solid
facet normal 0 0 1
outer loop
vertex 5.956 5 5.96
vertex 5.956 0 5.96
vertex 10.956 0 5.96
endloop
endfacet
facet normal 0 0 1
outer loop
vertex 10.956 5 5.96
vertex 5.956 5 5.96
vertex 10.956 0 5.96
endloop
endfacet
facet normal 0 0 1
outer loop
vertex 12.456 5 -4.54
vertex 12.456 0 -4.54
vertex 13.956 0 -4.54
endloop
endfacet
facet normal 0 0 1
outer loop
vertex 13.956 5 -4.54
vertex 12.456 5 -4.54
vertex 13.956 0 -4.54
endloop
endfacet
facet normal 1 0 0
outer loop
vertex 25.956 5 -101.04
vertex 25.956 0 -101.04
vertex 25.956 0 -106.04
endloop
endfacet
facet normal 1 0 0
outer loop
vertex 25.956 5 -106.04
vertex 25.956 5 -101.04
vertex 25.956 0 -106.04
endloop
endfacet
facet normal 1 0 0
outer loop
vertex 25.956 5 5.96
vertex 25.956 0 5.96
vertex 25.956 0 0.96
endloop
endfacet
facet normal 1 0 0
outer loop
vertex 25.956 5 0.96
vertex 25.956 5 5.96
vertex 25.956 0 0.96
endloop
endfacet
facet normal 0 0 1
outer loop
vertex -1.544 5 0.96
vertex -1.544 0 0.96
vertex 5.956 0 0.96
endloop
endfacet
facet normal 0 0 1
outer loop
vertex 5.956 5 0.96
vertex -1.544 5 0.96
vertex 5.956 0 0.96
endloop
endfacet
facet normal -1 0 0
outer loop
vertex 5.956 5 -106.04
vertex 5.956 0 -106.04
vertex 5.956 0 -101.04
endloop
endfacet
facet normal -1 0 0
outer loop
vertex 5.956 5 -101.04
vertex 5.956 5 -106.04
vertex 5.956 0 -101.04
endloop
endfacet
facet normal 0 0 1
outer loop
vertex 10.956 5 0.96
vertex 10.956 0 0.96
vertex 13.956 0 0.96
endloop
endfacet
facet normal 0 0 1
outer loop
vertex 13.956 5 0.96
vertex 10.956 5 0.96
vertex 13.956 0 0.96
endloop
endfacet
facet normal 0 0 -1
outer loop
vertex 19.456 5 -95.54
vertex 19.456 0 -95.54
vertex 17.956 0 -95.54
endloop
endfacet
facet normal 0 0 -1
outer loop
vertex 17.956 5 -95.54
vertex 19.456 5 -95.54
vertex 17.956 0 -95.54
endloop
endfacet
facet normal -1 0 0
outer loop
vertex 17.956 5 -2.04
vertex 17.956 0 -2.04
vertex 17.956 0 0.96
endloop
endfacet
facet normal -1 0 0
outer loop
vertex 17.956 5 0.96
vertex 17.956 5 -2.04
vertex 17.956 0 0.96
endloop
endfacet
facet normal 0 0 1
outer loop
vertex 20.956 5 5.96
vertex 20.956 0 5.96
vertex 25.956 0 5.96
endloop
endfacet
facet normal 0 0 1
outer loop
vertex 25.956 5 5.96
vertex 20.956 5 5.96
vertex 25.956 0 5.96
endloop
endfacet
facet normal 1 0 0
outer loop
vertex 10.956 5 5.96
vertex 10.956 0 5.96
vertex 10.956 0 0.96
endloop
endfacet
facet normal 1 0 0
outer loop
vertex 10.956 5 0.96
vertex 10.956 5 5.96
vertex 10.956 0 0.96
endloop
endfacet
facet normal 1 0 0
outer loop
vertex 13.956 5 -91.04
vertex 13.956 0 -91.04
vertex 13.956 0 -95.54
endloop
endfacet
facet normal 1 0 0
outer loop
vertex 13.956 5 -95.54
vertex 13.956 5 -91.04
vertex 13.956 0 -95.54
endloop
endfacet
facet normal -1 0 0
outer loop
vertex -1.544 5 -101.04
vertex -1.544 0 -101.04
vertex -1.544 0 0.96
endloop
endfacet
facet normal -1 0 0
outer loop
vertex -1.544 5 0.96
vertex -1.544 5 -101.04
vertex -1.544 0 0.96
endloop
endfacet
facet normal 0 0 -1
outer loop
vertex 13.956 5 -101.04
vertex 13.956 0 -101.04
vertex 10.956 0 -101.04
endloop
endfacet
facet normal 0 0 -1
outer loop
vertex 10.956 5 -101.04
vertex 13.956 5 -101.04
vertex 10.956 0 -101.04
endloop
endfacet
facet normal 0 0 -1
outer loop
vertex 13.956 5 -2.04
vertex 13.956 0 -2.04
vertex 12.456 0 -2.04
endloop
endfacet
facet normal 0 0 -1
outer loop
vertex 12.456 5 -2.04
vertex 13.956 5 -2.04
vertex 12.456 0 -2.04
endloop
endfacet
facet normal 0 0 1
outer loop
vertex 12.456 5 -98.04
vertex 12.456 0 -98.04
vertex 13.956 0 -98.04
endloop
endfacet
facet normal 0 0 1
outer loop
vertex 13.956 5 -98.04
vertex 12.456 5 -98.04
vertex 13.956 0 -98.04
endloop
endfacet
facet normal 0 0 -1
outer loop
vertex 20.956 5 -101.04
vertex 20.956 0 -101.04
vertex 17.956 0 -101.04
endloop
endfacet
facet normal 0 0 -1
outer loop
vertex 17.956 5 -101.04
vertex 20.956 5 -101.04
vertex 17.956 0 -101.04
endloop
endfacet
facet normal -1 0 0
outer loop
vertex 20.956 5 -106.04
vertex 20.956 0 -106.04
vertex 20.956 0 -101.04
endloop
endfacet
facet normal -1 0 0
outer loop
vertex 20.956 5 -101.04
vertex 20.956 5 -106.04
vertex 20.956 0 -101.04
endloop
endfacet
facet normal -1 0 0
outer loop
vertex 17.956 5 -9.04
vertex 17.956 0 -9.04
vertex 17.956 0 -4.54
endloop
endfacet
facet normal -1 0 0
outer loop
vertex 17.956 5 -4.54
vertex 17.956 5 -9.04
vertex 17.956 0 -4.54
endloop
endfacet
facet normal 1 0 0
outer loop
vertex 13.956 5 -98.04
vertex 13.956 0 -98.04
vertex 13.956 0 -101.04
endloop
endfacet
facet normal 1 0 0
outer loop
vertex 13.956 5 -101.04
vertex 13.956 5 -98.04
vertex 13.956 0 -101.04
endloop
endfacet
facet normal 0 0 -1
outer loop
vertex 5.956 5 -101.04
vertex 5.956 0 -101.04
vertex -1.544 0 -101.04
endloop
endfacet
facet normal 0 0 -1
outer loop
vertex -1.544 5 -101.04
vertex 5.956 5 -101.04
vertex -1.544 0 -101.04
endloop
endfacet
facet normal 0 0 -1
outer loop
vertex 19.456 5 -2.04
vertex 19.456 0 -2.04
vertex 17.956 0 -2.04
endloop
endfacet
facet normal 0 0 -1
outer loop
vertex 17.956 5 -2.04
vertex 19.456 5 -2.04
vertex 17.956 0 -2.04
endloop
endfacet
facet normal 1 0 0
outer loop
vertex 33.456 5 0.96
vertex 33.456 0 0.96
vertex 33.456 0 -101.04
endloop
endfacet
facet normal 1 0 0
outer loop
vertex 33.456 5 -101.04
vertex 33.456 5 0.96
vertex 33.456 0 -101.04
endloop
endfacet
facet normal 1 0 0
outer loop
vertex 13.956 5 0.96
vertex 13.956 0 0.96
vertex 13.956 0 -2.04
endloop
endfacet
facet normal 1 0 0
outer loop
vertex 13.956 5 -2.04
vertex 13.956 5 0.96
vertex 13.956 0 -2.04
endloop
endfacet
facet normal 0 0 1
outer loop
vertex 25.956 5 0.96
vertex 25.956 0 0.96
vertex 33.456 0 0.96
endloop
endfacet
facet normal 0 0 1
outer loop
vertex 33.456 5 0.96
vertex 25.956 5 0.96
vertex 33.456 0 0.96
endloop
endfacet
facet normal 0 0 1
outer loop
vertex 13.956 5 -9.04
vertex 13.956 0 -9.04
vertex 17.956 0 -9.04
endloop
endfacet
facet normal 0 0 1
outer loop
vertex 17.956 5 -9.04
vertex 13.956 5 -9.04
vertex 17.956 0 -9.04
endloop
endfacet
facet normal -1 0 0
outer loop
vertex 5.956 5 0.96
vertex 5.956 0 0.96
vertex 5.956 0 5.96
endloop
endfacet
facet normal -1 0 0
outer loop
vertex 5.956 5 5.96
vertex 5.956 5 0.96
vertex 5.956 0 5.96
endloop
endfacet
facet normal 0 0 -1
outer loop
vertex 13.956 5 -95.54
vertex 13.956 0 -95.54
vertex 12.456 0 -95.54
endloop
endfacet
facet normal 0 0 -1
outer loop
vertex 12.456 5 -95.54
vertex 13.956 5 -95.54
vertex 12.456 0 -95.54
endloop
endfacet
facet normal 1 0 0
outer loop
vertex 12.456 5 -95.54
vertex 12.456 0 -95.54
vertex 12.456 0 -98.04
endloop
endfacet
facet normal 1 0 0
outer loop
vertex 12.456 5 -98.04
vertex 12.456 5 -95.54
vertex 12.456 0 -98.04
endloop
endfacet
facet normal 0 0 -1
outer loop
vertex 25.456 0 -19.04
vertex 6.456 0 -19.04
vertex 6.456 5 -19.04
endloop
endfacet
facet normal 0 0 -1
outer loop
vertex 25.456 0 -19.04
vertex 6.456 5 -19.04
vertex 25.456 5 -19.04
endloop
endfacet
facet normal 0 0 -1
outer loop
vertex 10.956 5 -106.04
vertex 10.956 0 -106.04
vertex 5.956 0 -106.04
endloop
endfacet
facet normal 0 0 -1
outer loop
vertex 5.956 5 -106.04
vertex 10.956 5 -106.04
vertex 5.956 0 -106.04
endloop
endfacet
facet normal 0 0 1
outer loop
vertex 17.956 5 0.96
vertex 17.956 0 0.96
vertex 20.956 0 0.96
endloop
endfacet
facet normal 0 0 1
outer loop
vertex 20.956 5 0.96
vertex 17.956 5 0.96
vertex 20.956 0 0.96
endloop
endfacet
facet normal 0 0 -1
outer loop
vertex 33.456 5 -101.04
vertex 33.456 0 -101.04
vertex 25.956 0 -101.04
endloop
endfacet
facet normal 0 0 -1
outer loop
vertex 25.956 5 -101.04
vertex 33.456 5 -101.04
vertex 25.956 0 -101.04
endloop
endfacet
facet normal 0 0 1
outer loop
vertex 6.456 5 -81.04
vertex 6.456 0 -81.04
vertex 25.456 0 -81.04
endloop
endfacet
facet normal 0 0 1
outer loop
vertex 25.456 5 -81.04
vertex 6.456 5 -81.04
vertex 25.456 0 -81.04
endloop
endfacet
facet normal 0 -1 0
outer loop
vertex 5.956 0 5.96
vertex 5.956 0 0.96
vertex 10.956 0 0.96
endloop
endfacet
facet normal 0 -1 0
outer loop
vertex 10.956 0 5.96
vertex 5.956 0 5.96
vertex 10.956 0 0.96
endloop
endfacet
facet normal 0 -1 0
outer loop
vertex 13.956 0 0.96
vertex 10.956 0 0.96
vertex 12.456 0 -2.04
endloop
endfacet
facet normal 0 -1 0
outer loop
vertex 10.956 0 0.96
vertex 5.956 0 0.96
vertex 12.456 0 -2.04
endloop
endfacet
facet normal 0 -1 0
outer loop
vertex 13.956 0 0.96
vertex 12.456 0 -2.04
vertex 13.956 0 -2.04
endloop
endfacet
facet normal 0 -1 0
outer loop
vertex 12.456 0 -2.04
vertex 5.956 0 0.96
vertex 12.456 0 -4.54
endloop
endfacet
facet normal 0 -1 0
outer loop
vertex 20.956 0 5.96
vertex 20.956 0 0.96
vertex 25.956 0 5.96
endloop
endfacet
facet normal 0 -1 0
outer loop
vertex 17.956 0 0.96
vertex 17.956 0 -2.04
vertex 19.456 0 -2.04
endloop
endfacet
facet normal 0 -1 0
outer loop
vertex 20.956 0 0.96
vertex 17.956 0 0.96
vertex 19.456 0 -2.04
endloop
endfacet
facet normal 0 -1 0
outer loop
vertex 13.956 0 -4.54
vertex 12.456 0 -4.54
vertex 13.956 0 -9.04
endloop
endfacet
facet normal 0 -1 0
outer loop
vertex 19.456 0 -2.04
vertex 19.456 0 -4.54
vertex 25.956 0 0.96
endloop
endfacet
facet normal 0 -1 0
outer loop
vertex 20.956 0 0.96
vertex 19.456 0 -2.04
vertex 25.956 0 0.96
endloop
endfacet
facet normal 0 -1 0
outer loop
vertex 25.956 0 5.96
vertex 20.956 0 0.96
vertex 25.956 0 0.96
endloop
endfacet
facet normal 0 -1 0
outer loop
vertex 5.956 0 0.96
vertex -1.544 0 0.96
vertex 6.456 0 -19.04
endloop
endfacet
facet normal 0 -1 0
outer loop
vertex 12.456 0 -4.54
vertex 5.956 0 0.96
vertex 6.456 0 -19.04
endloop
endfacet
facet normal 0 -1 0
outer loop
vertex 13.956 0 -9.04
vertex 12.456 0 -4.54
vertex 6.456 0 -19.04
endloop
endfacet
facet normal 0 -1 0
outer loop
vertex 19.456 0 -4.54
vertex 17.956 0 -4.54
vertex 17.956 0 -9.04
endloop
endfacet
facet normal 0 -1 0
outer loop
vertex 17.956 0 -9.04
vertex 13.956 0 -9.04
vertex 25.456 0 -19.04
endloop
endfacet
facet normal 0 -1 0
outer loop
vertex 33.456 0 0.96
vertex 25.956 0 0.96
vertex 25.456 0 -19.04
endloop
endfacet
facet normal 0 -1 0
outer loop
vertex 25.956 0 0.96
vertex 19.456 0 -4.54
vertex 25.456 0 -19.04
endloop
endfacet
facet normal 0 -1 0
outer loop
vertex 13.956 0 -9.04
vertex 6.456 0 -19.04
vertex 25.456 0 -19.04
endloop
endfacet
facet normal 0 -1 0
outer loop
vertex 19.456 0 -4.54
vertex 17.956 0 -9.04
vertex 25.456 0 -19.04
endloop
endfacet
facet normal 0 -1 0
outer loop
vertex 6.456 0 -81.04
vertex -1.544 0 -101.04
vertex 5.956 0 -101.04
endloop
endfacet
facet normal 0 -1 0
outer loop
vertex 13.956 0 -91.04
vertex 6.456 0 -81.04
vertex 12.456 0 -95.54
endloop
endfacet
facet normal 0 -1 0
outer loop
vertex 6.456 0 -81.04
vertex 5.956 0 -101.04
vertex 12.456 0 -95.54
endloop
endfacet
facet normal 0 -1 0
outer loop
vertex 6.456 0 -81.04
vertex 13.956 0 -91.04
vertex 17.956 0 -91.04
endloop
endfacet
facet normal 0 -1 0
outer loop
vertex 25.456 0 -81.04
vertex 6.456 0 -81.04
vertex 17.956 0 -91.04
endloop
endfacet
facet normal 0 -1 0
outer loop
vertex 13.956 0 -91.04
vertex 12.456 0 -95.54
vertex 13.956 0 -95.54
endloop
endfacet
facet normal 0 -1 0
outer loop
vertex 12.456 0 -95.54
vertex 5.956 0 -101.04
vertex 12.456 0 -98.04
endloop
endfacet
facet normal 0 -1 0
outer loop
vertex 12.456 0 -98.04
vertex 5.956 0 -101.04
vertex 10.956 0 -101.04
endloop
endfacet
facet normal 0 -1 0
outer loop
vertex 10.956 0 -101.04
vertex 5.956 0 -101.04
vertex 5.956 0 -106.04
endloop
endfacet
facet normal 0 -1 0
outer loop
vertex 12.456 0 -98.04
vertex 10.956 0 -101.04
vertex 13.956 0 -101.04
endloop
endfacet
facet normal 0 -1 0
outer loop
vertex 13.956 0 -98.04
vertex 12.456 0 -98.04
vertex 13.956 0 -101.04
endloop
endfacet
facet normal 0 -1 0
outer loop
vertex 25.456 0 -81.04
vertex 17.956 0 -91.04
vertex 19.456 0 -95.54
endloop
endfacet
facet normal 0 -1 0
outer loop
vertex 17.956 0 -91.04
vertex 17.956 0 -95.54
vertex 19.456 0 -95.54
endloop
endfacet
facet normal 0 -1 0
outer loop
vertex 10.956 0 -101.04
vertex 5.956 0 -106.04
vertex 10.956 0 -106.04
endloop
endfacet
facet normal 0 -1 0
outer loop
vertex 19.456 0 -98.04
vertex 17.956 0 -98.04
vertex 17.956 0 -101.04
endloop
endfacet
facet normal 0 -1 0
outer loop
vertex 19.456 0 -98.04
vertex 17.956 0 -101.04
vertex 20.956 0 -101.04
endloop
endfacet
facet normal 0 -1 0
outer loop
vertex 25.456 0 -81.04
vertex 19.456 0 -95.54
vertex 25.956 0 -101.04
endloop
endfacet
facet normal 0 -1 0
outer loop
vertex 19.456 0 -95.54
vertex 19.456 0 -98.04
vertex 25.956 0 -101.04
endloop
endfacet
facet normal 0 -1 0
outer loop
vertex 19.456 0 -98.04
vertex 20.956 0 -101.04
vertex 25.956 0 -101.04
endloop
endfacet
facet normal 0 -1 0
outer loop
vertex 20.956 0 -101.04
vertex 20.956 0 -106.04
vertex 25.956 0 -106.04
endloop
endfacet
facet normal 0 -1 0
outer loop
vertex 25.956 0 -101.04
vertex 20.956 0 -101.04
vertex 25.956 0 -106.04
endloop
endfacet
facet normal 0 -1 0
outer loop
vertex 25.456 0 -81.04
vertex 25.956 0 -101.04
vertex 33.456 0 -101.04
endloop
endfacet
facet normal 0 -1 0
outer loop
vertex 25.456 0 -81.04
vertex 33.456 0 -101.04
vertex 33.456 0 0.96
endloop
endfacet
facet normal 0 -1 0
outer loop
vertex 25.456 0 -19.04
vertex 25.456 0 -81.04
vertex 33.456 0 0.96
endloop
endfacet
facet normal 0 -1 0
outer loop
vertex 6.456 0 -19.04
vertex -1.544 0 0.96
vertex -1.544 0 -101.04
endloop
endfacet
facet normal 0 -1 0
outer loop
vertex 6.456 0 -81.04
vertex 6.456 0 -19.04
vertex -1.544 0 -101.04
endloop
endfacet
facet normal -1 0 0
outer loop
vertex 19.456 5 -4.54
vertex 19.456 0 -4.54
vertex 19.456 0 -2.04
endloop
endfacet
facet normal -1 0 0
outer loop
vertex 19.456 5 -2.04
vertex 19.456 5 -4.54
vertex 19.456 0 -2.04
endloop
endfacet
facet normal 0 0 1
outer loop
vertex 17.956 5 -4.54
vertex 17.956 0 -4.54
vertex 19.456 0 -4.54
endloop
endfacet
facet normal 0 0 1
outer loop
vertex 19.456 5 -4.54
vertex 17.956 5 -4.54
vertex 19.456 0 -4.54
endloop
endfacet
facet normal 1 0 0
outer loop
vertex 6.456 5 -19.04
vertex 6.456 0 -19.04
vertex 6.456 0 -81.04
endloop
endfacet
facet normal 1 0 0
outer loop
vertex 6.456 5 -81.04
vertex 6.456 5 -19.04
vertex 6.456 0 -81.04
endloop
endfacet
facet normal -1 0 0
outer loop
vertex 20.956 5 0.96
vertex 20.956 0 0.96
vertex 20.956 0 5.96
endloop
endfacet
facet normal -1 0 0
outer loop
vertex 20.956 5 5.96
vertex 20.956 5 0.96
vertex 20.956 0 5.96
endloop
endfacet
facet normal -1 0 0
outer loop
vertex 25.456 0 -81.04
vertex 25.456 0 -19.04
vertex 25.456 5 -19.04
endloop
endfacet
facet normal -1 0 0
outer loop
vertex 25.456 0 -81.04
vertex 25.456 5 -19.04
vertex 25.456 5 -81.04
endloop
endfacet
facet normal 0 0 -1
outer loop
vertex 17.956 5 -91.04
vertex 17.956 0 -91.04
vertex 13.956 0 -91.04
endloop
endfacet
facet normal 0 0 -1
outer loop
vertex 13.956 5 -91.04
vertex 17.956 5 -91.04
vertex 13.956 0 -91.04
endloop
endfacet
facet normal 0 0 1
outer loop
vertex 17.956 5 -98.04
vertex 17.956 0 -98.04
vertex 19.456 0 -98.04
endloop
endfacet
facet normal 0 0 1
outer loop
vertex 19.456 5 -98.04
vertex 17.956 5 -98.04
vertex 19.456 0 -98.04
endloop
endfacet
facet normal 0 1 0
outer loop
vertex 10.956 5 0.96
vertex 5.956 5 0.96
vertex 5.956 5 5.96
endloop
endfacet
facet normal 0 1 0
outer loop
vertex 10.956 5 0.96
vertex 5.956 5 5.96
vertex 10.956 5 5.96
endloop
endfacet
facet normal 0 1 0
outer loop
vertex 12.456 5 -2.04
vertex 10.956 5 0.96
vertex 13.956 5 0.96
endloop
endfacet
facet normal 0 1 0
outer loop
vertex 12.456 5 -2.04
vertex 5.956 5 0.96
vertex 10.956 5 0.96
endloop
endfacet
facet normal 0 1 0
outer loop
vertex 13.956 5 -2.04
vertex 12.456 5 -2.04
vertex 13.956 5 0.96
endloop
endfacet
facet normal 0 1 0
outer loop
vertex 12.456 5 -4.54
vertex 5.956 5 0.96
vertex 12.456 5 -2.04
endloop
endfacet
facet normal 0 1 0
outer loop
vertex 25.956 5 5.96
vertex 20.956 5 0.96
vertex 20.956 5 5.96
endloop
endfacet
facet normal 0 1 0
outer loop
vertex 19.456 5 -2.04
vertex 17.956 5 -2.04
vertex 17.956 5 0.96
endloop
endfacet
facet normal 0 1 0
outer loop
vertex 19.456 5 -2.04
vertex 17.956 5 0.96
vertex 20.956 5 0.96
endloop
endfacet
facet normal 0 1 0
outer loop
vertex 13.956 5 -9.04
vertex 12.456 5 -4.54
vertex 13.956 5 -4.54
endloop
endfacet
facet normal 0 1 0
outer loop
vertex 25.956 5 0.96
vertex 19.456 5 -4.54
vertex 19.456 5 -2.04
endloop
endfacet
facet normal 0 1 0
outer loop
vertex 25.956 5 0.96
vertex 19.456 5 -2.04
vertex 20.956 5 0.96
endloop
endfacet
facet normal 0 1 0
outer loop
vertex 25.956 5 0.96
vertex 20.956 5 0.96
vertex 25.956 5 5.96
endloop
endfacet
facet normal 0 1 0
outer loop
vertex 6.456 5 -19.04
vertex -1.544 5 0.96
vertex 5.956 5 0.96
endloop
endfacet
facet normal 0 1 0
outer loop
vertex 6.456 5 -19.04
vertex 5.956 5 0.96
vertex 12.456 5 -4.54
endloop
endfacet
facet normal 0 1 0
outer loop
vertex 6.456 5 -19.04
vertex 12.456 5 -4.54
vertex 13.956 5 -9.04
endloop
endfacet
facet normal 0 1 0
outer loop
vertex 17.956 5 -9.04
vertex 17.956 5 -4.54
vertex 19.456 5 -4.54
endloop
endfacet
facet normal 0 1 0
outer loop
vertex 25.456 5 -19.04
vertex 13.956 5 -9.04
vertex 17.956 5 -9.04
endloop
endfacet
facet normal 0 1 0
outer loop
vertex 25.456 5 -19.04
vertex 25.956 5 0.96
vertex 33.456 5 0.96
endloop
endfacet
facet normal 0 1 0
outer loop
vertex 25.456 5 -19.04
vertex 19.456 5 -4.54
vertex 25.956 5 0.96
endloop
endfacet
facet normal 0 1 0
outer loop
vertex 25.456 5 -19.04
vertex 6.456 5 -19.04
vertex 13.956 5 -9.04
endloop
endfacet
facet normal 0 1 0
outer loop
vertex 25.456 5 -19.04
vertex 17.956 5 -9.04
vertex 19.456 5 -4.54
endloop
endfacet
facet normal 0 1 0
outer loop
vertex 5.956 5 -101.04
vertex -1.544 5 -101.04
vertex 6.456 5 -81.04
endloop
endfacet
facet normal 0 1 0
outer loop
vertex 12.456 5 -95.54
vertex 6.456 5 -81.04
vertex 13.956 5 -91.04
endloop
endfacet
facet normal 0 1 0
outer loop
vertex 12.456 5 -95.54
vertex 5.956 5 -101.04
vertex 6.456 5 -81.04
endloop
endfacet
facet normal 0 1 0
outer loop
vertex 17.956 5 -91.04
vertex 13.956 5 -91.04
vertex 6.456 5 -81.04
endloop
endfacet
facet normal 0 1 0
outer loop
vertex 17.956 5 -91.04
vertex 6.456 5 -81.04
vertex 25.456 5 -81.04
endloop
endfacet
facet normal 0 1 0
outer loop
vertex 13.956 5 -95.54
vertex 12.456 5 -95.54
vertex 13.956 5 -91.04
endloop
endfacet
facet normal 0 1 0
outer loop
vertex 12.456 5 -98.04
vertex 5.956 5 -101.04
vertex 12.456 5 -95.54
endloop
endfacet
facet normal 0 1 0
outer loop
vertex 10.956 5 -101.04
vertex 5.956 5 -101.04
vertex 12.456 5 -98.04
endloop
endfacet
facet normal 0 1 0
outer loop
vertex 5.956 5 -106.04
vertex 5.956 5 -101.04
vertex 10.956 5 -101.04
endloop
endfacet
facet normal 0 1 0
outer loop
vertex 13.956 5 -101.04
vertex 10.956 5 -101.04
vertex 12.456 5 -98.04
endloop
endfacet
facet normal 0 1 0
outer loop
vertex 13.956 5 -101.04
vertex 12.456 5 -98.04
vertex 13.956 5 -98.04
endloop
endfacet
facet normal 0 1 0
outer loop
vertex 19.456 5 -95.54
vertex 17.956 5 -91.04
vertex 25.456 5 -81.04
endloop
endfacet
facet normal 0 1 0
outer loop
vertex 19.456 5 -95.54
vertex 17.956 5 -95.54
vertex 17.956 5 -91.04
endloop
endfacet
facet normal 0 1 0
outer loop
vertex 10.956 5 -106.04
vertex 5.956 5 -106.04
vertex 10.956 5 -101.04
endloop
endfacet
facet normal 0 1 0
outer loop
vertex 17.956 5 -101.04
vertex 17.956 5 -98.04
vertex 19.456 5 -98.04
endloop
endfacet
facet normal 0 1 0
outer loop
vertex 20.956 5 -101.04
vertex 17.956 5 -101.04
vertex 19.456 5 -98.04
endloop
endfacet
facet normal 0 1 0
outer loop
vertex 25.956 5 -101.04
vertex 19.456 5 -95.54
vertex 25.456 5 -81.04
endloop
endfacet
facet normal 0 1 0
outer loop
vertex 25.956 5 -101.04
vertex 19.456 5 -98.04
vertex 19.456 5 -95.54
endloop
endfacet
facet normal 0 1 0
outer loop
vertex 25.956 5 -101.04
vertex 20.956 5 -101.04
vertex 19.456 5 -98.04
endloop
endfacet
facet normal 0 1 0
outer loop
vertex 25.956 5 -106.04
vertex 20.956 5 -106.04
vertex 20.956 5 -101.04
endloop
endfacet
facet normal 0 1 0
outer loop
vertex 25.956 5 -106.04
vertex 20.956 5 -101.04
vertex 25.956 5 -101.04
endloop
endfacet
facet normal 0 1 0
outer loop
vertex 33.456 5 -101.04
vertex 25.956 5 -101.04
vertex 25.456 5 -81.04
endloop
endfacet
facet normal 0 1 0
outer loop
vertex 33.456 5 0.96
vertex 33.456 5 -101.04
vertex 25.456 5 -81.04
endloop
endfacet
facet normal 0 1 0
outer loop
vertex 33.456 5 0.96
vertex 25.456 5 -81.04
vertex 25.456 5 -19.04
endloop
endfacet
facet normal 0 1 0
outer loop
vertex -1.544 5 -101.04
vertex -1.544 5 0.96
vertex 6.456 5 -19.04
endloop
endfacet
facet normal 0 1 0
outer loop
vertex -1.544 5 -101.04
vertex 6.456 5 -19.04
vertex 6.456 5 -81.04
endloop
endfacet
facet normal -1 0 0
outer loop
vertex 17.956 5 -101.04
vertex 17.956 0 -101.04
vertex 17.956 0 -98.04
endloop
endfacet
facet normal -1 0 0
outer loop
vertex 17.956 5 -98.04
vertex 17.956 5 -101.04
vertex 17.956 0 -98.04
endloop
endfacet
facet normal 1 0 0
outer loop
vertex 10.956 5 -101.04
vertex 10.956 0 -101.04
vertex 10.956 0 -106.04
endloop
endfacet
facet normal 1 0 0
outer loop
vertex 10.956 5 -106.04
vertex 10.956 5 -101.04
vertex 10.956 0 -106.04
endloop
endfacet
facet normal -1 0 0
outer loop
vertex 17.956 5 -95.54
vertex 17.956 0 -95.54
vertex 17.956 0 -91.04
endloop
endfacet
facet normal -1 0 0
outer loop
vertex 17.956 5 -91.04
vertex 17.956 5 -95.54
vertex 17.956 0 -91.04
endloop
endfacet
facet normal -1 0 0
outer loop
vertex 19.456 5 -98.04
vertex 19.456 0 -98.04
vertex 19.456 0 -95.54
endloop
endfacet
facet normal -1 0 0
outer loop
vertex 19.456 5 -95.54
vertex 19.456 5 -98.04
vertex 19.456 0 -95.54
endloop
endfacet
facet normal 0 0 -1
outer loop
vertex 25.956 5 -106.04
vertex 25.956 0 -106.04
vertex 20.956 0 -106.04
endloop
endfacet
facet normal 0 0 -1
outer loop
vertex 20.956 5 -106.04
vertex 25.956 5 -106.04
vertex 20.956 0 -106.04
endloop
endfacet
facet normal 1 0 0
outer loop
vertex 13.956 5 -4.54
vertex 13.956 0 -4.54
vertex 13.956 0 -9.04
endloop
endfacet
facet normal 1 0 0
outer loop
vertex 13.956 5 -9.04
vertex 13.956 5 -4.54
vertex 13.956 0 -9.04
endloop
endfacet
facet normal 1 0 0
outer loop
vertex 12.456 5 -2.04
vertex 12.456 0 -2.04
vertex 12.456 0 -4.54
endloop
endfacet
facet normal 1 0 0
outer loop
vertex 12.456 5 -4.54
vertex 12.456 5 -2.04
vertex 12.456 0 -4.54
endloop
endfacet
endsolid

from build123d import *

# Parameters (mm, degrees)
SKETCH1_W           = 19
SKETCH1_H           = 62
BOSS_EXTRUDE1_DEPTH = 5


with BuildPart() as part:
    # Sketch1 → Boss-Extrude1 (new body)
    with BuildSketch(Plane(origin=(0, 0, 0), x_dir=(1, 0, 0), z_dir=(0, 1, 0))):
        Polygon((-1.543955144, 19.039548023), (-1.543955144, -0.960451977), (5.956044856, -0.960451977), (5.956044856, -5.960451977), (10.956044856, -5.960451977), (10.956044856, -0.960451977), (13.956044856, -0.960451977), (13.956044856, 2.039548023), (12.456044856, 2.039548023), (12.456044856, 4.539548023), (13.956044856, 4.539548023), (13.956044856, 9.039548023), (17.956044856, 9.039548023), (17.956044856, 4.539548023), (19.456044856, 4.539548023), (19.456044856, 2.039548023), (17.956044856, 2.039548023), (17.956044856, -0.960451977), (20.956044856, -0.960451977), (20.956044856, -5.960451977), (25.956044856, -5.960451977), (25.956044856, -0.960451977), (33.456044856, -0.960451977), (33.456044856, 19.039548023), (33.456044856, 81.039548023), (33.456044856, 101.039548023), (25.956044856, 101.039548023), (25.956044856, 106.039548023), (20.956044856, 106.039548023), (20.956044856, 101.039548023), (17.956044856, 101.039548023), (17.956044856, 98.039548023), (19.456044856, 98.039548023), (19.456044856, 95.539548023), (17.956044856, 95.539548023), (17.956044856, 91.039548023), (13.956044856, 91.039548023), (13.956044856, 95.539548023), (12.456044856, 95.539548023), (12.456044856, 98.039548023), (13.956044856, 98.039548023), (13.956044856, 101.039548023), (10.956044856, 101.039548023), (10.956044856, 106.039548023), (5.956044856, 106.039548023), (5.956044856, 101.039548023), (-1.543955144, 101.039548023), (-1.543955144, 81.039548023), align=None)
        with Locations((15.956044856, 50.039548023)):
            Rectangle(SKETCH1_W, SKETCH1_H, mode=Mode.SUBTRACT)
    extrude(amount=BOSS_EXTRUDE1_DEPTH)


solid = part.part
